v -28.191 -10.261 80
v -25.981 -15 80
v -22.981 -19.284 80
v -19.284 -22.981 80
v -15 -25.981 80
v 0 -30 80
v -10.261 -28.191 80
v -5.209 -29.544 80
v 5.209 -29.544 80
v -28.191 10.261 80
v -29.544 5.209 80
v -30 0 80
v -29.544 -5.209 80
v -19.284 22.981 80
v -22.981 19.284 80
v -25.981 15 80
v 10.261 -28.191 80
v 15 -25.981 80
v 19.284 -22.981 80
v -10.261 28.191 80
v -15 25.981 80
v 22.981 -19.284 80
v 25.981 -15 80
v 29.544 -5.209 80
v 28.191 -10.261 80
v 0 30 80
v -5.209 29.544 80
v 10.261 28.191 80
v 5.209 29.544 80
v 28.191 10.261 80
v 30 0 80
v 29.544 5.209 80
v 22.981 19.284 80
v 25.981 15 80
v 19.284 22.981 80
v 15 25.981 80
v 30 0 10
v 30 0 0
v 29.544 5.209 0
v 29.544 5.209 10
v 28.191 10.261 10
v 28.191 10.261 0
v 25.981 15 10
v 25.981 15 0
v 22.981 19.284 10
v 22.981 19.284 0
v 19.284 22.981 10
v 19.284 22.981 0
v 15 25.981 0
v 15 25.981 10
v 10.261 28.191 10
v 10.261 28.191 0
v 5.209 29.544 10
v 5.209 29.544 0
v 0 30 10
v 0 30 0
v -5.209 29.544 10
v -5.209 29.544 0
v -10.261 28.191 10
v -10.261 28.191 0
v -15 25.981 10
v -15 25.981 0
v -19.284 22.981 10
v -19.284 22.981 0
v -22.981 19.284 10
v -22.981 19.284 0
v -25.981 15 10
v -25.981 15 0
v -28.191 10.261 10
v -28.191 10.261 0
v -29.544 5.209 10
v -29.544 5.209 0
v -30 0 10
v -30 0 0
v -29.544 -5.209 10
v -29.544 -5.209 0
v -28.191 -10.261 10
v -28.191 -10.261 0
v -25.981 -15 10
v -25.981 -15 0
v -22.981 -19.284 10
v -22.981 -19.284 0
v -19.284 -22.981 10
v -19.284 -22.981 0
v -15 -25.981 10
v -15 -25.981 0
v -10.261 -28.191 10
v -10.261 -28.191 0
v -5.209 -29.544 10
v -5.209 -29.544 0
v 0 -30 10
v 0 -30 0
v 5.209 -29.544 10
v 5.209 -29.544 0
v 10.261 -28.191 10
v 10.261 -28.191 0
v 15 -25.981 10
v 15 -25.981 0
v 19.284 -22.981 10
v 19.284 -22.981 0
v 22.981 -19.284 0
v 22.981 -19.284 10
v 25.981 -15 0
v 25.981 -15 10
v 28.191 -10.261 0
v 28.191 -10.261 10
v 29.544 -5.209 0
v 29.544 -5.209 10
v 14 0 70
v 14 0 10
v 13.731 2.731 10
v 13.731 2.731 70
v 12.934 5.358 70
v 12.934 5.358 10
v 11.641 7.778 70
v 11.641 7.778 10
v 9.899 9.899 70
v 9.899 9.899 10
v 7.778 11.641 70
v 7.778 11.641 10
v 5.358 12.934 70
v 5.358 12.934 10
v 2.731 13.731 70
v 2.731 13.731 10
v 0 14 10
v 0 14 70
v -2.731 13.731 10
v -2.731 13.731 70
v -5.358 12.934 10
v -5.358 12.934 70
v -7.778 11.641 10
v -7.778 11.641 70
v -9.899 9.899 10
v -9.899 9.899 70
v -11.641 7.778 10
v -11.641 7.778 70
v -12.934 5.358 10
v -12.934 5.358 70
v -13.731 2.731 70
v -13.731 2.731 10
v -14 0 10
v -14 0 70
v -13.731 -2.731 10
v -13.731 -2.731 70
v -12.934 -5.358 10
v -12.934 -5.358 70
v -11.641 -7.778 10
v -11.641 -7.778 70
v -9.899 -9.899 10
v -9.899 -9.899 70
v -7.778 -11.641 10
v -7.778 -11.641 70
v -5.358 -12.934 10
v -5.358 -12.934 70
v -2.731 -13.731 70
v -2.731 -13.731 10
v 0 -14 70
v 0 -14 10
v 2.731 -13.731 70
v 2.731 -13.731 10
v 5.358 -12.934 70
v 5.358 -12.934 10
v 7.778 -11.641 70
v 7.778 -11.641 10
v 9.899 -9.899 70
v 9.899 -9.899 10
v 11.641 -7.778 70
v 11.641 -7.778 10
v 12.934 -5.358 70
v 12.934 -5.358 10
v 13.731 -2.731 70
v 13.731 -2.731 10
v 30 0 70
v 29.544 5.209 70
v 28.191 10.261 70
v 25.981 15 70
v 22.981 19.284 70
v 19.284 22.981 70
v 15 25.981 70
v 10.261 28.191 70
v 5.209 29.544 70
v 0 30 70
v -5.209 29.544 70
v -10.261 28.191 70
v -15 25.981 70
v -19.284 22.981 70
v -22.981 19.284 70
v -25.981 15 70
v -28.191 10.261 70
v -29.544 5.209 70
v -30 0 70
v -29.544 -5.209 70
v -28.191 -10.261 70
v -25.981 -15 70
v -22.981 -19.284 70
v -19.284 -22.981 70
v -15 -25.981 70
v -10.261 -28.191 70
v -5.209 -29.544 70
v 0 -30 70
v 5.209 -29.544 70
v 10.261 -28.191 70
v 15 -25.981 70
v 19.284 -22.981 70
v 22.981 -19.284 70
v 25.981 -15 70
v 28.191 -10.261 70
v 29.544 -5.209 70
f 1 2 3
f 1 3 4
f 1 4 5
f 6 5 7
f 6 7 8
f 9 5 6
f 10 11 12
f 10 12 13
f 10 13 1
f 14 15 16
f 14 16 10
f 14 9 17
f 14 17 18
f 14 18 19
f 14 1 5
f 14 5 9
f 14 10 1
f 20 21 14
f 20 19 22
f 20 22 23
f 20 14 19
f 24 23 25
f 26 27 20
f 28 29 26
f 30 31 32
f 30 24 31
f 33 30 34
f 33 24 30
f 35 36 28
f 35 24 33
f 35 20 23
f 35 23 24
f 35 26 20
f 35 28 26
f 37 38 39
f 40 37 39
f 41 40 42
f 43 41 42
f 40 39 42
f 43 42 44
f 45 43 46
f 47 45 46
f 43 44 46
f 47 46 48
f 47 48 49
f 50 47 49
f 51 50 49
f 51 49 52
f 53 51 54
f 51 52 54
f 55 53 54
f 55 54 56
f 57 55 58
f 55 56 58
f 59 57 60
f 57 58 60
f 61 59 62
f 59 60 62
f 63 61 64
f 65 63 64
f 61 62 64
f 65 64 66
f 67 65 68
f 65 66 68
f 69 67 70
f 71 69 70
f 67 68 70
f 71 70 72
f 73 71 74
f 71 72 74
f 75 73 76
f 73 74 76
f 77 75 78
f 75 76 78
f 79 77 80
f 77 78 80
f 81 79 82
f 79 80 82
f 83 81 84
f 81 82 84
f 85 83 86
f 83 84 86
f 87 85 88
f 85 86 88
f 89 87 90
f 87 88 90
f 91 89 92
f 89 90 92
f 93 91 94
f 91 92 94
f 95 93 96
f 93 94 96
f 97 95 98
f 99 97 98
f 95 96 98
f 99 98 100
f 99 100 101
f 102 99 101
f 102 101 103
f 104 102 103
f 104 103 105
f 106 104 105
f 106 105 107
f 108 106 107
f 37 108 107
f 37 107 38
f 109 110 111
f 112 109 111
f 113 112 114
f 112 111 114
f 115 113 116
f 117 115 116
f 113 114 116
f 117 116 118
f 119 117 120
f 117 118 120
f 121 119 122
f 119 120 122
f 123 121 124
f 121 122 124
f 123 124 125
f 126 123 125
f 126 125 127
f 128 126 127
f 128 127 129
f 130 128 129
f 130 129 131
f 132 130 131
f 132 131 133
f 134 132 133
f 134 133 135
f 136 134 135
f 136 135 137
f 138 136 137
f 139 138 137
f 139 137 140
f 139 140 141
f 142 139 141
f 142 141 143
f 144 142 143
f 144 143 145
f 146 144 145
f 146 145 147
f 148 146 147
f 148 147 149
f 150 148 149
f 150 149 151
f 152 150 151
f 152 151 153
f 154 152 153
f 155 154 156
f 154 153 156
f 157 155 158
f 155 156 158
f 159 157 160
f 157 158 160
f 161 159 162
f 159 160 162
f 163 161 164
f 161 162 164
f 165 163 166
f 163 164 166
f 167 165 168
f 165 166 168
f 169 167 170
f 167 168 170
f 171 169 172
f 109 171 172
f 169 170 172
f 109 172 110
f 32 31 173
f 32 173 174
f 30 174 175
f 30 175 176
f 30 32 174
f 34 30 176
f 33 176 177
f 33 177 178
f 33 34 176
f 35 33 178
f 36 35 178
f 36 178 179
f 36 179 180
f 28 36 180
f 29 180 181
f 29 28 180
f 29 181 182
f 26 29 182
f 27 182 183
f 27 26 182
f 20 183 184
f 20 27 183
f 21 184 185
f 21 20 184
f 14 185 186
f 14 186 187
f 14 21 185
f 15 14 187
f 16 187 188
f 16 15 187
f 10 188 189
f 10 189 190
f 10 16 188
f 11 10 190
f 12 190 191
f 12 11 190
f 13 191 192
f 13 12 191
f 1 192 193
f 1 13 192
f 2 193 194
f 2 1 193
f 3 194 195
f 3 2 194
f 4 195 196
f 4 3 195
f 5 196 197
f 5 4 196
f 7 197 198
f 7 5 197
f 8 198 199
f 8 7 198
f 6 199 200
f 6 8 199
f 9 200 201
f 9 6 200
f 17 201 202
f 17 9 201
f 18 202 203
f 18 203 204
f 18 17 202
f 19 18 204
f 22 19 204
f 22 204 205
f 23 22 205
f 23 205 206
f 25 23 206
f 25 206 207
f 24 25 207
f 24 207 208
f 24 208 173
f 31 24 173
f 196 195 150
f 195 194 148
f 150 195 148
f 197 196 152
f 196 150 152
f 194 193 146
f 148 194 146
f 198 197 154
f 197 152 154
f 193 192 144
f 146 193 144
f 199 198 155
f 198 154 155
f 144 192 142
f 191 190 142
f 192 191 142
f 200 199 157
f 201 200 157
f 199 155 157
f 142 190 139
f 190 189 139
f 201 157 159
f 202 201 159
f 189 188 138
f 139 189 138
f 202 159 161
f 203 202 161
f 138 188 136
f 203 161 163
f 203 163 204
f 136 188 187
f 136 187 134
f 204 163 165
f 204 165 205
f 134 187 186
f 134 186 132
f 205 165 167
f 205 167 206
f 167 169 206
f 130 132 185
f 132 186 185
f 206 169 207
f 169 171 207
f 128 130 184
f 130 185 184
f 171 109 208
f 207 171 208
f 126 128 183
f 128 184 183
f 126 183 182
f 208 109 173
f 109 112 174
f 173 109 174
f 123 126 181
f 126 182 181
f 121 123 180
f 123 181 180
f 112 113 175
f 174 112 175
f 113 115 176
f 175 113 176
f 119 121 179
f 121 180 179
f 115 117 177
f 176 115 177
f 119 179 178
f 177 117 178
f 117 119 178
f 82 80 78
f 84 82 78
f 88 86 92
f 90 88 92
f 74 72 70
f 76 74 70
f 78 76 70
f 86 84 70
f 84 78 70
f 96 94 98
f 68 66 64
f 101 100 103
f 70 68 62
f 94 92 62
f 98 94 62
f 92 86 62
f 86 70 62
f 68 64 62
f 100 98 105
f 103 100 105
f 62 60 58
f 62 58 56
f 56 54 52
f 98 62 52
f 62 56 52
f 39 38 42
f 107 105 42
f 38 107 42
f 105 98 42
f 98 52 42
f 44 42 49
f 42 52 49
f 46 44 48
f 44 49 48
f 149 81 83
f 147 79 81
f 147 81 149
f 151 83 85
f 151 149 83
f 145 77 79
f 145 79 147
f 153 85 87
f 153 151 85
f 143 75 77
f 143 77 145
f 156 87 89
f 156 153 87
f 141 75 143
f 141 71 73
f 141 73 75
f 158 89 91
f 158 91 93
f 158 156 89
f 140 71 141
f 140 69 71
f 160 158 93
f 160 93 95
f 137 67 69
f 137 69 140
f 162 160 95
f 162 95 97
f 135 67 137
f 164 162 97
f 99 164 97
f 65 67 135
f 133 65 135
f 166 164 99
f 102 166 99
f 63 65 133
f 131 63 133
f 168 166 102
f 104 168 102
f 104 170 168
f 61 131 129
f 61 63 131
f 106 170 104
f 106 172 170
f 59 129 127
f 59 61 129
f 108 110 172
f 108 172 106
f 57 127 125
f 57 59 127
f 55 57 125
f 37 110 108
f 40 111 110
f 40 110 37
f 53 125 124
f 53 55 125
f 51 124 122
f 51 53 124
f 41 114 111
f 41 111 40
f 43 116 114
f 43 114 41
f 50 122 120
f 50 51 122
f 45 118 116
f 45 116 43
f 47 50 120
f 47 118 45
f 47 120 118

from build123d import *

# Parameters (mm, degrees)
SKETCH_1_R           = 30
SKETCH_1_R_2         = 14
EXTRUDE_1_DEPTH      = 10
SKETCH_2_R           = 14
EXTRUDE_2_DEPTH      = 70
EXTRUDE_2_DEPTH_BACK = 10
SKETCH_3_R           = 30
SKETCH_3_R_2         = 14
EXTRUDE_3_DEPTH      = 10


with BuildPart() as part:
    # 草图1 → 凸台-拉伸1 (new body)
    with BuildSketch(Plane.XY):
        Circle(SKETCH_1_R)
        Circle(SKETCH_1_R_2, mode=Mode.SUBTRACT)
    extrude(amount=EXTRUDE_1_DEPTH)

    # 草图2 → 凸台-拉伸2 (add, two sides)
    with BuildSketch(Plane.XY.offset(10)) as extrude_2_sk:
        Circle(SKETCH_2_R)
    extrude(amount=EXTRUDE_2_DEPTH)
    extrude(extrude_2_sk.sketch, amount=-EXTRUDE_2_DEPTH_BACK)

    # 草图3 → 凸台-拉伸3 (add)
    with BuildSketch(Plane.XY.offset(80)):
        Circle(SKETCH_3_R)
        Circle(SKETCH_3_R_2, mode=Mode.SUBTRACT)
    extrude(amount=-EXTRUDE_3_DEPTH)


solid = part.part
